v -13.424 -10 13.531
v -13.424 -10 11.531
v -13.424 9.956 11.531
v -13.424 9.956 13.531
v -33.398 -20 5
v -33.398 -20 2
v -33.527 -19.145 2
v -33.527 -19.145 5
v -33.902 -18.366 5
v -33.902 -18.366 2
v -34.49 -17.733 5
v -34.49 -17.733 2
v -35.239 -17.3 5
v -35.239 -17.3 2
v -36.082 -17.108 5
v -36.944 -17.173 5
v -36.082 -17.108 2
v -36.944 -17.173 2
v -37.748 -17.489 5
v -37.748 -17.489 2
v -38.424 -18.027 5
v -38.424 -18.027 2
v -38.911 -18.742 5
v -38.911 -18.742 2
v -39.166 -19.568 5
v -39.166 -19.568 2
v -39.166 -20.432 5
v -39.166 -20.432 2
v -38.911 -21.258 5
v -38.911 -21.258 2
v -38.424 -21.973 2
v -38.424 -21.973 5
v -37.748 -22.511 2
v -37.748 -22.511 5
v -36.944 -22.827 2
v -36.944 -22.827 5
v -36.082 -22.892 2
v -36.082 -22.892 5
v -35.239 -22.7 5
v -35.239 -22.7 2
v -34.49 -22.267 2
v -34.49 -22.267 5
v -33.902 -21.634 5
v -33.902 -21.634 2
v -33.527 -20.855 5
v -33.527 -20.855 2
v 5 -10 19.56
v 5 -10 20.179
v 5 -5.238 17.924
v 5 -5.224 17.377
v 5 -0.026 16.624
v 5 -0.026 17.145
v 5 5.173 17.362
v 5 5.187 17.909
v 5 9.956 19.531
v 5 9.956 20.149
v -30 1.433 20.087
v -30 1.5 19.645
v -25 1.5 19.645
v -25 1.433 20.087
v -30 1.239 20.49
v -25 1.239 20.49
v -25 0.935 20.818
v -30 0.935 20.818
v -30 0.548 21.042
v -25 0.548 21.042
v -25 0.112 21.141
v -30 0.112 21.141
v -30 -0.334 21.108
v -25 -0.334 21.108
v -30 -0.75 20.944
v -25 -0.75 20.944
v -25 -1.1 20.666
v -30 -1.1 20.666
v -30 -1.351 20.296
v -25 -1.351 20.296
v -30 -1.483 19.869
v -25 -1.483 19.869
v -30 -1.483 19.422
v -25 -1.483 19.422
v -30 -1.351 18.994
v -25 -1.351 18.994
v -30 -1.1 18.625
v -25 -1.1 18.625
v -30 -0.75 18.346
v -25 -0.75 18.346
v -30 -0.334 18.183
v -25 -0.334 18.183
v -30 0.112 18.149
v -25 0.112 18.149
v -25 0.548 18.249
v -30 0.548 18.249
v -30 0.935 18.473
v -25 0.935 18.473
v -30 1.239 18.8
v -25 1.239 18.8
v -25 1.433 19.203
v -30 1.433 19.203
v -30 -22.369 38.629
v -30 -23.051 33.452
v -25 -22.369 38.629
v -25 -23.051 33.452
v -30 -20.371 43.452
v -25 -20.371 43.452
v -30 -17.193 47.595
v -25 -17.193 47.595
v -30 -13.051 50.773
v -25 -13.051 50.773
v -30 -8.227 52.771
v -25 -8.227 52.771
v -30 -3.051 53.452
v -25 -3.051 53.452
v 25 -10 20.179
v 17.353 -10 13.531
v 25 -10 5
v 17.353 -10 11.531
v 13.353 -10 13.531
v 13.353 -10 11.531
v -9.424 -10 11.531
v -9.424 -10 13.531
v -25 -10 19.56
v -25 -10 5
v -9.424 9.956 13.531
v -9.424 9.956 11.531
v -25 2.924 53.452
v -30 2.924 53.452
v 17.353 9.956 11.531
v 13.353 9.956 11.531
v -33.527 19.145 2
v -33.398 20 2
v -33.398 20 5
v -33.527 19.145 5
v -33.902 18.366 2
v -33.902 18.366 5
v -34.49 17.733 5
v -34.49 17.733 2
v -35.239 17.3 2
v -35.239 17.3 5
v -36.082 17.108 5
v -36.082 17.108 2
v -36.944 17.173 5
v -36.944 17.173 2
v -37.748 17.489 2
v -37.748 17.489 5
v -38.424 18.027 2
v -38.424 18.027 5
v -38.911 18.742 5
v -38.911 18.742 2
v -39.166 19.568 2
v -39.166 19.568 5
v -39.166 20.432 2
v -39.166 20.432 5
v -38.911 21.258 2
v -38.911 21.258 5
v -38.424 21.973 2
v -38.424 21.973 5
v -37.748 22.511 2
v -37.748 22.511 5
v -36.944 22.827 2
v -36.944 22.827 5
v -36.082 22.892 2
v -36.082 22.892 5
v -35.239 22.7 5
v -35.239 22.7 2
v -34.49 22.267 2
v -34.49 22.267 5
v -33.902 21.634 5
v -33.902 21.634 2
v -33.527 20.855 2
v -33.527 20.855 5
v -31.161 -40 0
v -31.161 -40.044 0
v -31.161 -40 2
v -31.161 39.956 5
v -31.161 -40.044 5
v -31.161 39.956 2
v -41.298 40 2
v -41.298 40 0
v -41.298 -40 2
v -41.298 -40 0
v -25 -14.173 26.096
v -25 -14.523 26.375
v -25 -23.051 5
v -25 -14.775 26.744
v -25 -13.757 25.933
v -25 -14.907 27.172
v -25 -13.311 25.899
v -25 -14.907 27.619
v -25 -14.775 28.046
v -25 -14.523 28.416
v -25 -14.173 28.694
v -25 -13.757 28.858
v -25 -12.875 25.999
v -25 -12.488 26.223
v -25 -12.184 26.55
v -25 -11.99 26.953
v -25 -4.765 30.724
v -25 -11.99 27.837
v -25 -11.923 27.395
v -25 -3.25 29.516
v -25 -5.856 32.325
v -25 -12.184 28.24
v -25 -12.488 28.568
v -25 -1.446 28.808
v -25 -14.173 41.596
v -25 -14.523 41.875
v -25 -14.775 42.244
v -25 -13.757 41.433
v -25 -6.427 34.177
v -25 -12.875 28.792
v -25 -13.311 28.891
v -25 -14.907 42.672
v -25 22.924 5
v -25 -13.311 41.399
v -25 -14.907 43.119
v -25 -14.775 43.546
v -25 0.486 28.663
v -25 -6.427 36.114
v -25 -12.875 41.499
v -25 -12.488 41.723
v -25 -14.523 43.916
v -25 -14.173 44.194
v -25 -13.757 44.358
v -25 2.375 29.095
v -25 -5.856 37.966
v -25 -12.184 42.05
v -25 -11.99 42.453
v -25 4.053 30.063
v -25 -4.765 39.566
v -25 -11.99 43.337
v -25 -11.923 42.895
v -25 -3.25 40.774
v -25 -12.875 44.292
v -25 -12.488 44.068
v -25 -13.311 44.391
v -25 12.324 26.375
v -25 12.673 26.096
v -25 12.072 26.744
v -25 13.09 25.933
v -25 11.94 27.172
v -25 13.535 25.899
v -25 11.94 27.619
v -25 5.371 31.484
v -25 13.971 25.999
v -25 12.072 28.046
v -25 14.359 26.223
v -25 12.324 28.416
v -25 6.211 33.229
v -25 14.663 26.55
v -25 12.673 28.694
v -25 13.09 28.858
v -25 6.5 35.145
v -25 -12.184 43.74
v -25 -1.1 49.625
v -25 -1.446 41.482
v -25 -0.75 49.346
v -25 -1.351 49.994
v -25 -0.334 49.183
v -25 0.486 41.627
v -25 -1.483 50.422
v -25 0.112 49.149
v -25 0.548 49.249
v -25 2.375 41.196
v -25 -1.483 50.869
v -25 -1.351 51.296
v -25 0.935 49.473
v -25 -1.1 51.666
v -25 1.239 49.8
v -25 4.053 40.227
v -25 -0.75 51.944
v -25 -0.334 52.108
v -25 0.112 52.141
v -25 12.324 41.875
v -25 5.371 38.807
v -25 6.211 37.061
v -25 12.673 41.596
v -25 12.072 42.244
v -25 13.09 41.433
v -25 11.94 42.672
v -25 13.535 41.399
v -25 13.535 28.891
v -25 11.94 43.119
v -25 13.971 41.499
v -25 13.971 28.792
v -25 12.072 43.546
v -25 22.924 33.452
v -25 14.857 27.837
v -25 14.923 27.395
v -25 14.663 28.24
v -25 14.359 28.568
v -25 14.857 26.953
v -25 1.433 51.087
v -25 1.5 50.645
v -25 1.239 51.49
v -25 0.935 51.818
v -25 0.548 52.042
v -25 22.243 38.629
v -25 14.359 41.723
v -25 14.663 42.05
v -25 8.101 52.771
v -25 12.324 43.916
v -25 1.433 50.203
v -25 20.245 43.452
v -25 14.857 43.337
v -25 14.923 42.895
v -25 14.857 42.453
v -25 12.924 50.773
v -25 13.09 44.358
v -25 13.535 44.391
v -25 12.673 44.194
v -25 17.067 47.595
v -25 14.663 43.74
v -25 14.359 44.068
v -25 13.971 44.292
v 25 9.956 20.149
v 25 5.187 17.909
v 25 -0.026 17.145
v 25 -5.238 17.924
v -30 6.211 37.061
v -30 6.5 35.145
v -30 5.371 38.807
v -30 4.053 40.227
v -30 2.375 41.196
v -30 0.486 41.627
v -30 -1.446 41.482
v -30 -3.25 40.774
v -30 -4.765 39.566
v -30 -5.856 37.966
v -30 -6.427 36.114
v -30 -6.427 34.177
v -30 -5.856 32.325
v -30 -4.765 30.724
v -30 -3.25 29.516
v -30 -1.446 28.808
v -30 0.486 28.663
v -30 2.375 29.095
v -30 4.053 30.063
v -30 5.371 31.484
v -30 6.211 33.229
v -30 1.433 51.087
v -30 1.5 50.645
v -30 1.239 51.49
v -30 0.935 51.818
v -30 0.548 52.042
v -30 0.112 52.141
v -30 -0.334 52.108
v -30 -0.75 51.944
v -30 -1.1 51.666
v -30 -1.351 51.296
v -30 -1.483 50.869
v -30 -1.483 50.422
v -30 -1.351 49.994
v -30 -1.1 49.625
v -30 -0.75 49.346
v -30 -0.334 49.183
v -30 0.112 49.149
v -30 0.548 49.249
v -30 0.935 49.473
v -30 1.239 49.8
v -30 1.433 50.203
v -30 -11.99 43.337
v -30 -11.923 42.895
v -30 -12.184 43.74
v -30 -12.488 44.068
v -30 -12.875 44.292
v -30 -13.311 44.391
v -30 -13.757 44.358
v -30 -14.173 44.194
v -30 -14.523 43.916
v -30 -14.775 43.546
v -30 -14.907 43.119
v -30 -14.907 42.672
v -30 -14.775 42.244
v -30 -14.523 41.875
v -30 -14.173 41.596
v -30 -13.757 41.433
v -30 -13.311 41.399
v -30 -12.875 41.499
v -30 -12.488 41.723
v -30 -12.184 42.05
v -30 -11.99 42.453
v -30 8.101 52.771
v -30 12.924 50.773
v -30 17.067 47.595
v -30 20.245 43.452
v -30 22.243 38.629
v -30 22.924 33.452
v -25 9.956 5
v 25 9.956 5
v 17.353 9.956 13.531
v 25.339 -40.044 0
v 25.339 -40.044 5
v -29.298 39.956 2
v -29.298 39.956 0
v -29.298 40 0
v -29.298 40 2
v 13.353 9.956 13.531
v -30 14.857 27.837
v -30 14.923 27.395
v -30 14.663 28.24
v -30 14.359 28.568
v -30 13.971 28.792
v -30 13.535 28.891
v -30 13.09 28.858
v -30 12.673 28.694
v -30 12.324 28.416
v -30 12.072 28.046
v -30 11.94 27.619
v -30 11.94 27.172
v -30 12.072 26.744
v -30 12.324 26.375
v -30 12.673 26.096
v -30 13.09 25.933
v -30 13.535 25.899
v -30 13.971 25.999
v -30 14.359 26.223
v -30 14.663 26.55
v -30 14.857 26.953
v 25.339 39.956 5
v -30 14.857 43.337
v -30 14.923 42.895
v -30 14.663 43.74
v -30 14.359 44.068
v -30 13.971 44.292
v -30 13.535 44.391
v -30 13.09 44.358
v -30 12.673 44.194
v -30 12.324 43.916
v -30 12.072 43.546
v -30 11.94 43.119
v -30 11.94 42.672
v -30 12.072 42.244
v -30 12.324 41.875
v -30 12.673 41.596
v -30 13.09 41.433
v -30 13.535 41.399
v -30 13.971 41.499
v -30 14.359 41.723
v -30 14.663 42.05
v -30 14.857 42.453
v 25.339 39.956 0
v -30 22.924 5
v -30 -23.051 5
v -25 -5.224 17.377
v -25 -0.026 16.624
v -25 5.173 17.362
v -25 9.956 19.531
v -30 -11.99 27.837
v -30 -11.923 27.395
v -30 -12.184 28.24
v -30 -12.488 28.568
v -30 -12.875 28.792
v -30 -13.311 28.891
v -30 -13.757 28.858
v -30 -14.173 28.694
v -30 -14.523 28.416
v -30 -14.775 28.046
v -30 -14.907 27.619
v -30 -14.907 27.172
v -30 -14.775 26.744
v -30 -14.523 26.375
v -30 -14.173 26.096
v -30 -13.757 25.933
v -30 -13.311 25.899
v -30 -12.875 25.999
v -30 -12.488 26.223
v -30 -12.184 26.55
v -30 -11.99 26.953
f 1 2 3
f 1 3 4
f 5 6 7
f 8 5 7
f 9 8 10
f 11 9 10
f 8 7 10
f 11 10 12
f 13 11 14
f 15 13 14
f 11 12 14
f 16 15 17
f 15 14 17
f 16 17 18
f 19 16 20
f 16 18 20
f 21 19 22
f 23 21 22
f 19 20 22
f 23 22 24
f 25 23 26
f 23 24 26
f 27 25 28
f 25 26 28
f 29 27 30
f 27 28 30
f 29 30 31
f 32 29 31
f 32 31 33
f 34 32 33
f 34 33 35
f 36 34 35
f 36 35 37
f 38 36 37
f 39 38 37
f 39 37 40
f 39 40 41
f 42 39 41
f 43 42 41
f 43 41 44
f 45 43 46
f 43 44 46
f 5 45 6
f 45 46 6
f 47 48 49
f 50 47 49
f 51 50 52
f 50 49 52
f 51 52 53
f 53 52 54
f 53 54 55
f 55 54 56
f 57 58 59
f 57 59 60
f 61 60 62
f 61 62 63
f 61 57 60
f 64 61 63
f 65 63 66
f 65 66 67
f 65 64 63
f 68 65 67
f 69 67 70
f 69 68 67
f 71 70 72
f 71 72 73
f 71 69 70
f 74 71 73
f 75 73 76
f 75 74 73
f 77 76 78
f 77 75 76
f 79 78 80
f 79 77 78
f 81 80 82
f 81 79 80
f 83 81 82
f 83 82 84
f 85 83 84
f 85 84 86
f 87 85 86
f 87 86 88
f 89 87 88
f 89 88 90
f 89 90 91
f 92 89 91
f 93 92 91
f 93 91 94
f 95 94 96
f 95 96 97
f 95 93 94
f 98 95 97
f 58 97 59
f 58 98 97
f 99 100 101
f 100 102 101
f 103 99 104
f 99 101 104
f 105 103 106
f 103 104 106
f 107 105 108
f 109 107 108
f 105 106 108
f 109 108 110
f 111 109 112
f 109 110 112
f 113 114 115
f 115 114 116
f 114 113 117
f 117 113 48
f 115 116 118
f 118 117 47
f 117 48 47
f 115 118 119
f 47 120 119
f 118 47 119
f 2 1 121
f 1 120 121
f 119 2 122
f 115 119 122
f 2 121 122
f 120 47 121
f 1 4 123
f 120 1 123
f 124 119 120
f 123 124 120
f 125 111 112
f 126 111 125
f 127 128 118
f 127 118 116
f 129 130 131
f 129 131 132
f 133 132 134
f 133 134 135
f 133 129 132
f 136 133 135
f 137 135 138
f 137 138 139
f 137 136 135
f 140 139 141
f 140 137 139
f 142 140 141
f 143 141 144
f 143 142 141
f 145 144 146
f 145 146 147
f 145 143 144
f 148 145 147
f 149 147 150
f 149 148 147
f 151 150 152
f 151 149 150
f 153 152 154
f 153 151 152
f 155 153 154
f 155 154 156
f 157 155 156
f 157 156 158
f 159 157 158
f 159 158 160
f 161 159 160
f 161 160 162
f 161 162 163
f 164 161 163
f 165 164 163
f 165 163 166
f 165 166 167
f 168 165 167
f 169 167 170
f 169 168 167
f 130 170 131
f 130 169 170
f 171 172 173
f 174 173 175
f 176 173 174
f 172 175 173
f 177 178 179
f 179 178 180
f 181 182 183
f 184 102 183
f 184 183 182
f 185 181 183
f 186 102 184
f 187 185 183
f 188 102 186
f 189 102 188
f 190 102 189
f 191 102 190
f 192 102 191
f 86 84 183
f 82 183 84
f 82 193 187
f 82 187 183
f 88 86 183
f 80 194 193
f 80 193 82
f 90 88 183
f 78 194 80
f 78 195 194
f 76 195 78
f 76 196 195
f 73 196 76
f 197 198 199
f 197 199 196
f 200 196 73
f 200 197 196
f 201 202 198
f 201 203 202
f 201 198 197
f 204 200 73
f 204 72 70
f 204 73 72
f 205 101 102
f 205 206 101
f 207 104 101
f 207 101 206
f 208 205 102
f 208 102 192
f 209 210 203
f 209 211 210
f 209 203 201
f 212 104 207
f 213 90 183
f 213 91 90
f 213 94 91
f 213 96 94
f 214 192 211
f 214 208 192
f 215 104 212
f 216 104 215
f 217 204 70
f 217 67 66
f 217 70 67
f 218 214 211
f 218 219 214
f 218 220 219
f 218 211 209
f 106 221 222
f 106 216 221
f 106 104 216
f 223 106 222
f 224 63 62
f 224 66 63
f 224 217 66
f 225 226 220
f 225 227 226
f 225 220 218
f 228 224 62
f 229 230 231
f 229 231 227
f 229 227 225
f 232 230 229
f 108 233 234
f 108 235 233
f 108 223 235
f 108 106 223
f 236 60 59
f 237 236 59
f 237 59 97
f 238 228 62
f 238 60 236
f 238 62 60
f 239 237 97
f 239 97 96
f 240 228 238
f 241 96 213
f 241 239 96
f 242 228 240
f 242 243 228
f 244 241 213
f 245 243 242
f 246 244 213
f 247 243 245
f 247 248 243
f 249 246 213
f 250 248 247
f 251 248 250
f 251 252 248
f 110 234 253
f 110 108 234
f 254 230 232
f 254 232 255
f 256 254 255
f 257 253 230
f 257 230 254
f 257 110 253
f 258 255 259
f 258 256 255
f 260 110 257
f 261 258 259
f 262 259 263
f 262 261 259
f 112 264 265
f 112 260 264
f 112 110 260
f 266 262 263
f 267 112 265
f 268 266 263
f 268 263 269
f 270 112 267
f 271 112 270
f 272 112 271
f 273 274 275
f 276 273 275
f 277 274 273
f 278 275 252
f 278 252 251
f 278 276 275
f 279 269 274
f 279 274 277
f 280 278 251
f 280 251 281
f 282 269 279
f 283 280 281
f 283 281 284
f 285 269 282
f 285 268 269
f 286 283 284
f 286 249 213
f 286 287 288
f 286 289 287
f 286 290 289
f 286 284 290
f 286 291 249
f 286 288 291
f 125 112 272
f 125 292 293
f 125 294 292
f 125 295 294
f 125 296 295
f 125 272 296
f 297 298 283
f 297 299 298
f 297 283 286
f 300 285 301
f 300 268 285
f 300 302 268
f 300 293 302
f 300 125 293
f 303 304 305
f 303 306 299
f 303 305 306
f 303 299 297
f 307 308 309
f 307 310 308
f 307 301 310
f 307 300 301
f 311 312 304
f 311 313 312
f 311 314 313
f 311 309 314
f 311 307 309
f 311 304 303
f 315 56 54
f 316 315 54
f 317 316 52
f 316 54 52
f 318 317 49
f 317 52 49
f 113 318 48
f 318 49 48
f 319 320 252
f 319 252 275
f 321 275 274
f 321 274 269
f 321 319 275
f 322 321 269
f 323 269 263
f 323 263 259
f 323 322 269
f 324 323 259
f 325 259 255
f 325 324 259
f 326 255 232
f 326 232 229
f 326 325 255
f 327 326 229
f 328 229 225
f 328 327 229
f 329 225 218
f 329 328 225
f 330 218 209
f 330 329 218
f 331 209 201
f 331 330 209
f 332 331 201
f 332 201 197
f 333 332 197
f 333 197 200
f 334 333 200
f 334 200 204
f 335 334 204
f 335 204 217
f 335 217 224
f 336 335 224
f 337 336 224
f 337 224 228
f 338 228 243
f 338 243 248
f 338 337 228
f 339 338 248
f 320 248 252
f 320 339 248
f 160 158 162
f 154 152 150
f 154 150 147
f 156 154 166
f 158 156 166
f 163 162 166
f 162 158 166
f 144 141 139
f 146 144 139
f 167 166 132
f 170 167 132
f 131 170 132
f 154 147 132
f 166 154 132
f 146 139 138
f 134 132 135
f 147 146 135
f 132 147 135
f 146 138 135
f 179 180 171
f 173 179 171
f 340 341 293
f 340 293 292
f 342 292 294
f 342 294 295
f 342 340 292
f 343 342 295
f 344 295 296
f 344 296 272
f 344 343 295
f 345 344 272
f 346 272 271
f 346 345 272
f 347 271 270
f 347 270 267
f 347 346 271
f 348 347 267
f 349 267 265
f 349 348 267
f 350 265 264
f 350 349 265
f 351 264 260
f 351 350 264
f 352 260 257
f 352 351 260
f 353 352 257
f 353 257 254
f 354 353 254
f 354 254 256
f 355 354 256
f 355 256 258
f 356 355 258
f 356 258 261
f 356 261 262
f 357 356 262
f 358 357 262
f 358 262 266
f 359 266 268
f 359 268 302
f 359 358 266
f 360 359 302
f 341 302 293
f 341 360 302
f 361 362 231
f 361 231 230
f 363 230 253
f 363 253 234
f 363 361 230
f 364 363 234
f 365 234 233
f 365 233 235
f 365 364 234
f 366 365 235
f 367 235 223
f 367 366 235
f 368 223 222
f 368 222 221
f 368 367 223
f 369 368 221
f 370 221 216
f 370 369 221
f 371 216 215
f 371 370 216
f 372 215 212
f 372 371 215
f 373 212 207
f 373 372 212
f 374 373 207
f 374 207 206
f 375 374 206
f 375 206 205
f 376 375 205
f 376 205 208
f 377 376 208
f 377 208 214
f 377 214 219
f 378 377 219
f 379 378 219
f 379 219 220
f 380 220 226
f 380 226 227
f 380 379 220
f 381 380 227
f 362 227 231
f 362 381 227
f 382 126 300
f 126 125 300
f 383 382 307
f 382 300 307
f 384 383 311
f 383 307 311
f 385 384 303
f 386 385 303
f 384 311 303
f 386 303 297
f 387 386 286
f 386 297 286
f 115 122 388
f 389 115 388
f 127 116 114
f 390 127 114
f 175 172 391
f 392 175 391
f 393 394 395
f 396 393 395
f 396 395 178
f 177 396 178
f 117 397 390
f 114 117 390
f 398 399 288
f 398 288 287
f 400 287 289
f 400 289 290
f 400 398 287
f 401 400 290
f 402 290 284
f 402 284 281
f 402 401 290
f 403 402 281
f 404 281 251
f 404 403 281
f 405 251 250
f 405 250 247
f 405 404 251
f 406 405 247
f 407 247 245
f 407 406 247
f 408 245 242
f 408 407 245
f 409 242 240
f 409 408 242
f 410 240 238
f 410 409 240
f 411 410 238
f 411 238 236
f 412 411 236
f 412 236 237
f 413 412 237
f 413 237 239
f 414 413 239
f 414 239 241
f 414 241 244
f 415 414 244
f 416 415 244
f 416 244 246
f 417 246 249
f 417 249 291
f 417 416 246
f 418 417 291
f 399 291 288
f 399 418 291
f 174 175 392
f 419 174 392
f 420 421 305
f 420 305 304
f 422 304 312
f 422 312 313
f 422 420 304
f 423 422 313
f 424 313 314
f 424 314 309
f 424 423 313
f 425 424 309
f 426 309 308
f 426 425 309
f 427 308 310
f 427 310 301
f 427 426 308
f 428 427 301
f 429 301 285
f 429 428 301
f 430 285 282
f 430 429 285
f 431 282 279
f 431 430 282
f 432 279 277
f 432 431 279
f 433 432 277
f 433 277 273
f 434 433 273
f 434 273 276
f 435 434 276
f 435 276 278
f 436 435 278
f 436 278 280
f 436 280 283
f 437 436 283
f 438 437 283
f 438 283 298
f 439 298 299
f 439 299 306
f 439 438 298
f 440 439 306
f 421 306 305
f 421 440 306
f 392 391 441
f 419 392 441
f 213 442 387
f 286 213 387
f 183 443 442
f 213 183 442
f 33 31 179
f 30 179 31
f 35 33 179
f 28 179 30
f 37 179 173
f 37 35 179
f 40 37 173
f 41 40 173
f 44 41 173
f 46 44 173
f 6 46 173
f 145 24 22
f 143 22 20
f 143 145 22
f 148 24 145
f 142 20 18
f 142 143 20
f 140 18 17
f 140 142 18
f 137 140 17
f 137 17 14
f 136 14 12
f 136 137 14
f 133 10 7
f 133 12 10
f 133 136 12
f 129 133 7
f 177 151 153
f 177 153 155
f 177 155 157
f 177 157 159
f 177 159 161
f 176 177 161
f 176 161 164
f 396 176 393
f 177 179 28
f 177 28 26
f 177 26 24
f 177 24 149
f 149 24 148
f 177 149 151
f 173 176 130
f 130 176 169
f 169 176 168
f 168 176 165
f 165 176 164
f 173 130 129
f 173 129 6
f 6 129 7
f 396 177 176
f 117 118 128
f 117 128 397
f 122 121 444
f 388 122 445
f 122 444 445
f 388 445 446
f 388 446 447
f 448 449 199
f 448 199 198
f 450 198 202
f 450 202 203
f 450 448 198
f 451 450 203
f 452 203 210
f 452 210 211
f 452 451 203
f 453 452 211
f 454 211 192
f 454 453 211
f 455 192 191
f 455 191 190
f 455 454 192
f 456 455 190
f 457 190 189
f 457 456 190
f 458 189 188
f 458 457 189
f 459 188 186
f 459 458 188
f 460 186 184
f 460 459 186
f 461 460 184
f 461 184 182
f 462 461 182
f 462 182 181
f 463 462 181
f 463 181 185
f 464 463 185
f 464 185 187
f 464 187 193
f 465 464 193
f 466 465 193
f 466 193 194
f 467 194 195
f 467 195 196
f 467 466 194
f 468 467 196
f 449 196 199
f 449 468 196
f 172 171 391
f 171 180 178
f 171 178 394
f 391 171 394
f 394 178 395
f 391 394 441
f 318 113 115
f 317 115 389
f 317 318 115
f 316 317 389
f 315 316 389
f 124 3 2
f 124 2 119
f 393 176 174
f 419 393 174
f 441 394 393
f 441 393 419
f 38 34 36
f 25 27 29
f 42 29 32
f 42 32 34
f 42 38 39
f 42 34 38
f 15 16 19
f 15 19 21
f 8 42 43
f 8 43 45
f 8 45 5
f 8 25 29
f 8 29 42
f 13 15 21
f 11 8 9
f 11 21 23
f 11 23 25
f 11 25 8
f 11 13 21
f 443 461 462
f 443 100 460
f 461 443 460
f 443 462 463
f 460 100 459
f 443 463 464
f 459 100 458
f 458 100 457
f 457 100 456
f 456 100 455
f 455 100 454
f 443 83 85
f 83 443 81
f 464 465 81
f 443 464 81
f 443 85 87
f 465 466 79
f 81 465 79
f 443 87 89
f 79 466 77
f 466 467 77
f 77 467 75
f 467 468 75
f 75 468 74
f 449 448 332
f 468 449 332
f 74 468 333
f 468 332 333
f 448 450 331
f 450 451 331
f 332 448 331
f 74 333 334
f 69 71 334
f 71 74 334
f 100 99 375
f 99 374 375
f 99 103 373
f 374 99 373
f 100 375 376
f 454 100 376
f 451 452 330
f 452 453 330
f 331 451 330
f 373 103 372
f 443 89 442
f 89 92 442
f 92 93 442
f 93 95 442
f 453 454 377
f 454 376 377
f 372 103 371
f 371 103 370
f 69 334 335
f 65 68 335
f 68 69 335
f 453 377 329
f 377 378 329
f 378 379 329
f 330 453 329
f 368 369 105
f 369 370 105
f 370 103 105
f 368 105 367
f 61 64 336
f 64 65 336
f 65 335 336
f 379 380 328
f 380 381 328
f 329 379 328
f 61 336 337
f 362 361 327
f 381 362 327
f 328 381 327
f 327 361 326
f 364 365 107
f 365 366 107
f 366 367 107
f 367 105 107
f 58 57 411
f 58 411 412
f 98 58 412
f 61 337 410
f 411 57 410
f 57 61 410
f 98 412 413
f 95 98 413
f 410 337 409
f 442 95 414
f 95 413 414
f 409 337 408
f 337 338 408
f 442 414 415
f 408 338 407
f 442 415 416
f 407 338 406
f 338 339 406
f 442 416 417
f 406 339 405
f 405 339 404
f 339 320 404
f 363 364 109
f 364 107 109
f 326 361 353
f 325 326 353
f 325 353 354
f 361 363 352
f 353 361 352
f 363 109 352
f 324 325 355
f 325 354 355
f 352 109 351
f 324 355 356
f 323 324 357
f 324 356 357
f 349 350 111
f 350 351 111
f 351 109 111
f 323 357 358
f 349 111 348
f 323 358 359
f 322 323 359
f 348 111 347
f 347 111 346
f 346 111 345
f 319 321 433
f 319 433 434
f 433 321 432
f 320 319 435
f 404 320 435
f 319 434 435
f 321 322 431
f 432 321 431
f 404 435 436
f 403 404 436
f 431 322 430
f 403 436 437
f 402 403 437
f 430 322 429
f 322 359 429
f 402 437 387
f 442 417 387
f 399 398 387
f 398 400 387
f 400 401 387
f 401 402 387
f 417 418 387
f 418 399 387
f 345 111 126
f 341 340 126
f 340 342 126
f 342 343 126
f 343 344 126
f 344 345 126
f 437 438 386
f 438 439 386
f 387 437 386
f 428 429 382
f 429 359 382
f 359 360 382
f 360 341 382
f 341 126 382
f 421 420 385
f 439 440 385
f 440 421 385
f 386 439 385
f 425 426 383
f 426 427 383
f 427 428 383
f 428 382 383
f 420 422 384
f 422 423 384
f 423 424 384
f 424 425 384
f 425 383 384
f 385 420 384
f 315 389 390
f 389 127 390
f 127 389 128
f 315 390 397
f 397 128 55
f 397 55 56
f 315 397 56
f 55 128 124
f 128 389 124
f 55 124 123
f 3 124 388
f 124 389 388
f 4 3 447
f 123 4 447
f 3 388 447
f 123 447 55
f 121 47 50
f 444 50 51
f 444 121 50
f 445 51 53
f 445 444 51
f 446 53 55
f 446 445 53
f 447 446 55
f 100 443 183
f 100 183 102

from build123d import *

# Parameters (mm, degrees)
F1_DEPTH  = 2
F2_R      = 2.9
F3_DEPTH  = 3
F5_W      = 56.5
F5_H      = 80
F6_DEPTH  = 5
F8_W      = 45.9754448384
F8_H      = 48.4524751604
F8_R      = 1.5
F8_R_2    = 6.5
F9_DEPTH  = 5
F11_DEPTH = 50
F12_R     = 18.5
F12_R_2   = 17.5
F13_DEPTH = 30
F14_R     = 20
F15_W     = 4
F15_H     = 2
F16_DEPTH = 25


with BuildPart() as f1:
    # F0 (on Top) → F1 (new body)
    with BuildSketch(Plane.XY):
        Polygon((-41.298494786, -40), (-31.298494786, -40), (-29.298494786, -40), (-29.298494786, 40), (-31.298494786, 40), (-41.298494786, 40), align=None)
    extrude(amount=F1_DEPTH)

    # F4: F3 across plane


with BuildPart() as f3:
    # F2 (on face) → F3 (new body)
    with BuildSketch(Plane.XY.offset(2)):
        with Locations((-36.298494786, -20)):
            Circle(F2_R)
    extrude(amount=F3_DEPTH)


with BuildPart() as f1_1:
    add(f1.part)
    add(f3.part.mirror(Plane.XZ))


    add(f3.part)  # F6 merges F3
    # F5 (on Top) → F6 (join)
    with BuildSketch(Plane.XY):
        with Locations((-2.911294505, -0.0439426303)):
            Rectangle(F5_W, F5_H)
    extrude(amount=F6_DEPTH)


with BuildPart() as f9:
    # F8 (on offset) → F9 (new body)
    with BuildSketch(Plane.YZ.offset(-30)):
        with Locations((-0.063222833, 29.2262375802)):
            Rectangle(F8_W, F8_H)
        with Locations((-13.4233937587, 27.3952950446)):
            Circle(F8_R, mode=Mode.SUBTRACT)
        with Locations((0, 19.6452950446)):
            Circle(F8_R, mode=Mode.SUBTRACT)
        with Locations((13.4233937587, 27.3952950446)):
            Circle(F8_R, mode=Mode.SUBTRACT)
        with Locations((-13.4233937587, 42.8952950446)):
            Circle(F8_R, mode=Mode.SUBTRACT)
        with Locations((0, 35.1452950446)):
            Circle(F8_R_2, mode=Mode.SUBTRACT)
        with Locations((0, 50.6452950446)):
            Circle(F8_R, mode=Mode.SUBTRACT)
        with Locations((13.4233937587, 42.8952950446)):
            Circle(F8_R, mode=Mode.SUBTRACT)
    extrude(amount=F9_DEPTH)

    # F14
    f14_edges = [f9.edges().sort_by_distance(p)[0] for p in [
        (-27.5, 22.9245, 53.452475),
        (-27.5, -23.050945, 53.452475),
    ]]
    fillet(f14_edges, radius=F14_R)


with BuildPart() as f11:
    # F10 (on face) → F11 (new body)
    with BuildSketch(Plane.YZ.offset(-25)):
        with BuildLine():
            Line((-10, 20.1786654975), (-10, 5))
            Line((-10, 5), (9.9560573697, 5))
            Line((9.9560573697, 5), (9.9560573697, 20.1493982174))
            ThreePointArc((9.9560573697, 20.1493982174), (-0.0263985248, 17.1453144024), (-10, 20.1786654975))
        make_face()
    extrude(amount=F11_DEPTH)

    # F12 (on face) → F13 (cut)
    with BuildSketch(Plane.YZ.offset(-25)):
        with Locations((0, 35.124)):
            Circle(F12_R)
        with Locations((0, 35.124)):
            Circle(F12_R_2, mode=Mode.SUBTRACT)
    extrude(amount=F13_DEPTH, mode=Mode.SUBTRACT)

    # F15 (on face) → F16 (cut)
    with BuildSketch(Plane.XZ.offset(10)):
        with Locations((-11.4235027209, 12.5306526423)):
            Rectangle(F15_W, F15_H)
        with Locations((15.3525347337, 12.5306526423)):
            Rectangle(F15_W, F15_H)
    extrude(amount=-F16_DEPTH, mode=Mode.SUBTRACT)


solid = Compound([f1_1.part, f9.part, f11.part])
